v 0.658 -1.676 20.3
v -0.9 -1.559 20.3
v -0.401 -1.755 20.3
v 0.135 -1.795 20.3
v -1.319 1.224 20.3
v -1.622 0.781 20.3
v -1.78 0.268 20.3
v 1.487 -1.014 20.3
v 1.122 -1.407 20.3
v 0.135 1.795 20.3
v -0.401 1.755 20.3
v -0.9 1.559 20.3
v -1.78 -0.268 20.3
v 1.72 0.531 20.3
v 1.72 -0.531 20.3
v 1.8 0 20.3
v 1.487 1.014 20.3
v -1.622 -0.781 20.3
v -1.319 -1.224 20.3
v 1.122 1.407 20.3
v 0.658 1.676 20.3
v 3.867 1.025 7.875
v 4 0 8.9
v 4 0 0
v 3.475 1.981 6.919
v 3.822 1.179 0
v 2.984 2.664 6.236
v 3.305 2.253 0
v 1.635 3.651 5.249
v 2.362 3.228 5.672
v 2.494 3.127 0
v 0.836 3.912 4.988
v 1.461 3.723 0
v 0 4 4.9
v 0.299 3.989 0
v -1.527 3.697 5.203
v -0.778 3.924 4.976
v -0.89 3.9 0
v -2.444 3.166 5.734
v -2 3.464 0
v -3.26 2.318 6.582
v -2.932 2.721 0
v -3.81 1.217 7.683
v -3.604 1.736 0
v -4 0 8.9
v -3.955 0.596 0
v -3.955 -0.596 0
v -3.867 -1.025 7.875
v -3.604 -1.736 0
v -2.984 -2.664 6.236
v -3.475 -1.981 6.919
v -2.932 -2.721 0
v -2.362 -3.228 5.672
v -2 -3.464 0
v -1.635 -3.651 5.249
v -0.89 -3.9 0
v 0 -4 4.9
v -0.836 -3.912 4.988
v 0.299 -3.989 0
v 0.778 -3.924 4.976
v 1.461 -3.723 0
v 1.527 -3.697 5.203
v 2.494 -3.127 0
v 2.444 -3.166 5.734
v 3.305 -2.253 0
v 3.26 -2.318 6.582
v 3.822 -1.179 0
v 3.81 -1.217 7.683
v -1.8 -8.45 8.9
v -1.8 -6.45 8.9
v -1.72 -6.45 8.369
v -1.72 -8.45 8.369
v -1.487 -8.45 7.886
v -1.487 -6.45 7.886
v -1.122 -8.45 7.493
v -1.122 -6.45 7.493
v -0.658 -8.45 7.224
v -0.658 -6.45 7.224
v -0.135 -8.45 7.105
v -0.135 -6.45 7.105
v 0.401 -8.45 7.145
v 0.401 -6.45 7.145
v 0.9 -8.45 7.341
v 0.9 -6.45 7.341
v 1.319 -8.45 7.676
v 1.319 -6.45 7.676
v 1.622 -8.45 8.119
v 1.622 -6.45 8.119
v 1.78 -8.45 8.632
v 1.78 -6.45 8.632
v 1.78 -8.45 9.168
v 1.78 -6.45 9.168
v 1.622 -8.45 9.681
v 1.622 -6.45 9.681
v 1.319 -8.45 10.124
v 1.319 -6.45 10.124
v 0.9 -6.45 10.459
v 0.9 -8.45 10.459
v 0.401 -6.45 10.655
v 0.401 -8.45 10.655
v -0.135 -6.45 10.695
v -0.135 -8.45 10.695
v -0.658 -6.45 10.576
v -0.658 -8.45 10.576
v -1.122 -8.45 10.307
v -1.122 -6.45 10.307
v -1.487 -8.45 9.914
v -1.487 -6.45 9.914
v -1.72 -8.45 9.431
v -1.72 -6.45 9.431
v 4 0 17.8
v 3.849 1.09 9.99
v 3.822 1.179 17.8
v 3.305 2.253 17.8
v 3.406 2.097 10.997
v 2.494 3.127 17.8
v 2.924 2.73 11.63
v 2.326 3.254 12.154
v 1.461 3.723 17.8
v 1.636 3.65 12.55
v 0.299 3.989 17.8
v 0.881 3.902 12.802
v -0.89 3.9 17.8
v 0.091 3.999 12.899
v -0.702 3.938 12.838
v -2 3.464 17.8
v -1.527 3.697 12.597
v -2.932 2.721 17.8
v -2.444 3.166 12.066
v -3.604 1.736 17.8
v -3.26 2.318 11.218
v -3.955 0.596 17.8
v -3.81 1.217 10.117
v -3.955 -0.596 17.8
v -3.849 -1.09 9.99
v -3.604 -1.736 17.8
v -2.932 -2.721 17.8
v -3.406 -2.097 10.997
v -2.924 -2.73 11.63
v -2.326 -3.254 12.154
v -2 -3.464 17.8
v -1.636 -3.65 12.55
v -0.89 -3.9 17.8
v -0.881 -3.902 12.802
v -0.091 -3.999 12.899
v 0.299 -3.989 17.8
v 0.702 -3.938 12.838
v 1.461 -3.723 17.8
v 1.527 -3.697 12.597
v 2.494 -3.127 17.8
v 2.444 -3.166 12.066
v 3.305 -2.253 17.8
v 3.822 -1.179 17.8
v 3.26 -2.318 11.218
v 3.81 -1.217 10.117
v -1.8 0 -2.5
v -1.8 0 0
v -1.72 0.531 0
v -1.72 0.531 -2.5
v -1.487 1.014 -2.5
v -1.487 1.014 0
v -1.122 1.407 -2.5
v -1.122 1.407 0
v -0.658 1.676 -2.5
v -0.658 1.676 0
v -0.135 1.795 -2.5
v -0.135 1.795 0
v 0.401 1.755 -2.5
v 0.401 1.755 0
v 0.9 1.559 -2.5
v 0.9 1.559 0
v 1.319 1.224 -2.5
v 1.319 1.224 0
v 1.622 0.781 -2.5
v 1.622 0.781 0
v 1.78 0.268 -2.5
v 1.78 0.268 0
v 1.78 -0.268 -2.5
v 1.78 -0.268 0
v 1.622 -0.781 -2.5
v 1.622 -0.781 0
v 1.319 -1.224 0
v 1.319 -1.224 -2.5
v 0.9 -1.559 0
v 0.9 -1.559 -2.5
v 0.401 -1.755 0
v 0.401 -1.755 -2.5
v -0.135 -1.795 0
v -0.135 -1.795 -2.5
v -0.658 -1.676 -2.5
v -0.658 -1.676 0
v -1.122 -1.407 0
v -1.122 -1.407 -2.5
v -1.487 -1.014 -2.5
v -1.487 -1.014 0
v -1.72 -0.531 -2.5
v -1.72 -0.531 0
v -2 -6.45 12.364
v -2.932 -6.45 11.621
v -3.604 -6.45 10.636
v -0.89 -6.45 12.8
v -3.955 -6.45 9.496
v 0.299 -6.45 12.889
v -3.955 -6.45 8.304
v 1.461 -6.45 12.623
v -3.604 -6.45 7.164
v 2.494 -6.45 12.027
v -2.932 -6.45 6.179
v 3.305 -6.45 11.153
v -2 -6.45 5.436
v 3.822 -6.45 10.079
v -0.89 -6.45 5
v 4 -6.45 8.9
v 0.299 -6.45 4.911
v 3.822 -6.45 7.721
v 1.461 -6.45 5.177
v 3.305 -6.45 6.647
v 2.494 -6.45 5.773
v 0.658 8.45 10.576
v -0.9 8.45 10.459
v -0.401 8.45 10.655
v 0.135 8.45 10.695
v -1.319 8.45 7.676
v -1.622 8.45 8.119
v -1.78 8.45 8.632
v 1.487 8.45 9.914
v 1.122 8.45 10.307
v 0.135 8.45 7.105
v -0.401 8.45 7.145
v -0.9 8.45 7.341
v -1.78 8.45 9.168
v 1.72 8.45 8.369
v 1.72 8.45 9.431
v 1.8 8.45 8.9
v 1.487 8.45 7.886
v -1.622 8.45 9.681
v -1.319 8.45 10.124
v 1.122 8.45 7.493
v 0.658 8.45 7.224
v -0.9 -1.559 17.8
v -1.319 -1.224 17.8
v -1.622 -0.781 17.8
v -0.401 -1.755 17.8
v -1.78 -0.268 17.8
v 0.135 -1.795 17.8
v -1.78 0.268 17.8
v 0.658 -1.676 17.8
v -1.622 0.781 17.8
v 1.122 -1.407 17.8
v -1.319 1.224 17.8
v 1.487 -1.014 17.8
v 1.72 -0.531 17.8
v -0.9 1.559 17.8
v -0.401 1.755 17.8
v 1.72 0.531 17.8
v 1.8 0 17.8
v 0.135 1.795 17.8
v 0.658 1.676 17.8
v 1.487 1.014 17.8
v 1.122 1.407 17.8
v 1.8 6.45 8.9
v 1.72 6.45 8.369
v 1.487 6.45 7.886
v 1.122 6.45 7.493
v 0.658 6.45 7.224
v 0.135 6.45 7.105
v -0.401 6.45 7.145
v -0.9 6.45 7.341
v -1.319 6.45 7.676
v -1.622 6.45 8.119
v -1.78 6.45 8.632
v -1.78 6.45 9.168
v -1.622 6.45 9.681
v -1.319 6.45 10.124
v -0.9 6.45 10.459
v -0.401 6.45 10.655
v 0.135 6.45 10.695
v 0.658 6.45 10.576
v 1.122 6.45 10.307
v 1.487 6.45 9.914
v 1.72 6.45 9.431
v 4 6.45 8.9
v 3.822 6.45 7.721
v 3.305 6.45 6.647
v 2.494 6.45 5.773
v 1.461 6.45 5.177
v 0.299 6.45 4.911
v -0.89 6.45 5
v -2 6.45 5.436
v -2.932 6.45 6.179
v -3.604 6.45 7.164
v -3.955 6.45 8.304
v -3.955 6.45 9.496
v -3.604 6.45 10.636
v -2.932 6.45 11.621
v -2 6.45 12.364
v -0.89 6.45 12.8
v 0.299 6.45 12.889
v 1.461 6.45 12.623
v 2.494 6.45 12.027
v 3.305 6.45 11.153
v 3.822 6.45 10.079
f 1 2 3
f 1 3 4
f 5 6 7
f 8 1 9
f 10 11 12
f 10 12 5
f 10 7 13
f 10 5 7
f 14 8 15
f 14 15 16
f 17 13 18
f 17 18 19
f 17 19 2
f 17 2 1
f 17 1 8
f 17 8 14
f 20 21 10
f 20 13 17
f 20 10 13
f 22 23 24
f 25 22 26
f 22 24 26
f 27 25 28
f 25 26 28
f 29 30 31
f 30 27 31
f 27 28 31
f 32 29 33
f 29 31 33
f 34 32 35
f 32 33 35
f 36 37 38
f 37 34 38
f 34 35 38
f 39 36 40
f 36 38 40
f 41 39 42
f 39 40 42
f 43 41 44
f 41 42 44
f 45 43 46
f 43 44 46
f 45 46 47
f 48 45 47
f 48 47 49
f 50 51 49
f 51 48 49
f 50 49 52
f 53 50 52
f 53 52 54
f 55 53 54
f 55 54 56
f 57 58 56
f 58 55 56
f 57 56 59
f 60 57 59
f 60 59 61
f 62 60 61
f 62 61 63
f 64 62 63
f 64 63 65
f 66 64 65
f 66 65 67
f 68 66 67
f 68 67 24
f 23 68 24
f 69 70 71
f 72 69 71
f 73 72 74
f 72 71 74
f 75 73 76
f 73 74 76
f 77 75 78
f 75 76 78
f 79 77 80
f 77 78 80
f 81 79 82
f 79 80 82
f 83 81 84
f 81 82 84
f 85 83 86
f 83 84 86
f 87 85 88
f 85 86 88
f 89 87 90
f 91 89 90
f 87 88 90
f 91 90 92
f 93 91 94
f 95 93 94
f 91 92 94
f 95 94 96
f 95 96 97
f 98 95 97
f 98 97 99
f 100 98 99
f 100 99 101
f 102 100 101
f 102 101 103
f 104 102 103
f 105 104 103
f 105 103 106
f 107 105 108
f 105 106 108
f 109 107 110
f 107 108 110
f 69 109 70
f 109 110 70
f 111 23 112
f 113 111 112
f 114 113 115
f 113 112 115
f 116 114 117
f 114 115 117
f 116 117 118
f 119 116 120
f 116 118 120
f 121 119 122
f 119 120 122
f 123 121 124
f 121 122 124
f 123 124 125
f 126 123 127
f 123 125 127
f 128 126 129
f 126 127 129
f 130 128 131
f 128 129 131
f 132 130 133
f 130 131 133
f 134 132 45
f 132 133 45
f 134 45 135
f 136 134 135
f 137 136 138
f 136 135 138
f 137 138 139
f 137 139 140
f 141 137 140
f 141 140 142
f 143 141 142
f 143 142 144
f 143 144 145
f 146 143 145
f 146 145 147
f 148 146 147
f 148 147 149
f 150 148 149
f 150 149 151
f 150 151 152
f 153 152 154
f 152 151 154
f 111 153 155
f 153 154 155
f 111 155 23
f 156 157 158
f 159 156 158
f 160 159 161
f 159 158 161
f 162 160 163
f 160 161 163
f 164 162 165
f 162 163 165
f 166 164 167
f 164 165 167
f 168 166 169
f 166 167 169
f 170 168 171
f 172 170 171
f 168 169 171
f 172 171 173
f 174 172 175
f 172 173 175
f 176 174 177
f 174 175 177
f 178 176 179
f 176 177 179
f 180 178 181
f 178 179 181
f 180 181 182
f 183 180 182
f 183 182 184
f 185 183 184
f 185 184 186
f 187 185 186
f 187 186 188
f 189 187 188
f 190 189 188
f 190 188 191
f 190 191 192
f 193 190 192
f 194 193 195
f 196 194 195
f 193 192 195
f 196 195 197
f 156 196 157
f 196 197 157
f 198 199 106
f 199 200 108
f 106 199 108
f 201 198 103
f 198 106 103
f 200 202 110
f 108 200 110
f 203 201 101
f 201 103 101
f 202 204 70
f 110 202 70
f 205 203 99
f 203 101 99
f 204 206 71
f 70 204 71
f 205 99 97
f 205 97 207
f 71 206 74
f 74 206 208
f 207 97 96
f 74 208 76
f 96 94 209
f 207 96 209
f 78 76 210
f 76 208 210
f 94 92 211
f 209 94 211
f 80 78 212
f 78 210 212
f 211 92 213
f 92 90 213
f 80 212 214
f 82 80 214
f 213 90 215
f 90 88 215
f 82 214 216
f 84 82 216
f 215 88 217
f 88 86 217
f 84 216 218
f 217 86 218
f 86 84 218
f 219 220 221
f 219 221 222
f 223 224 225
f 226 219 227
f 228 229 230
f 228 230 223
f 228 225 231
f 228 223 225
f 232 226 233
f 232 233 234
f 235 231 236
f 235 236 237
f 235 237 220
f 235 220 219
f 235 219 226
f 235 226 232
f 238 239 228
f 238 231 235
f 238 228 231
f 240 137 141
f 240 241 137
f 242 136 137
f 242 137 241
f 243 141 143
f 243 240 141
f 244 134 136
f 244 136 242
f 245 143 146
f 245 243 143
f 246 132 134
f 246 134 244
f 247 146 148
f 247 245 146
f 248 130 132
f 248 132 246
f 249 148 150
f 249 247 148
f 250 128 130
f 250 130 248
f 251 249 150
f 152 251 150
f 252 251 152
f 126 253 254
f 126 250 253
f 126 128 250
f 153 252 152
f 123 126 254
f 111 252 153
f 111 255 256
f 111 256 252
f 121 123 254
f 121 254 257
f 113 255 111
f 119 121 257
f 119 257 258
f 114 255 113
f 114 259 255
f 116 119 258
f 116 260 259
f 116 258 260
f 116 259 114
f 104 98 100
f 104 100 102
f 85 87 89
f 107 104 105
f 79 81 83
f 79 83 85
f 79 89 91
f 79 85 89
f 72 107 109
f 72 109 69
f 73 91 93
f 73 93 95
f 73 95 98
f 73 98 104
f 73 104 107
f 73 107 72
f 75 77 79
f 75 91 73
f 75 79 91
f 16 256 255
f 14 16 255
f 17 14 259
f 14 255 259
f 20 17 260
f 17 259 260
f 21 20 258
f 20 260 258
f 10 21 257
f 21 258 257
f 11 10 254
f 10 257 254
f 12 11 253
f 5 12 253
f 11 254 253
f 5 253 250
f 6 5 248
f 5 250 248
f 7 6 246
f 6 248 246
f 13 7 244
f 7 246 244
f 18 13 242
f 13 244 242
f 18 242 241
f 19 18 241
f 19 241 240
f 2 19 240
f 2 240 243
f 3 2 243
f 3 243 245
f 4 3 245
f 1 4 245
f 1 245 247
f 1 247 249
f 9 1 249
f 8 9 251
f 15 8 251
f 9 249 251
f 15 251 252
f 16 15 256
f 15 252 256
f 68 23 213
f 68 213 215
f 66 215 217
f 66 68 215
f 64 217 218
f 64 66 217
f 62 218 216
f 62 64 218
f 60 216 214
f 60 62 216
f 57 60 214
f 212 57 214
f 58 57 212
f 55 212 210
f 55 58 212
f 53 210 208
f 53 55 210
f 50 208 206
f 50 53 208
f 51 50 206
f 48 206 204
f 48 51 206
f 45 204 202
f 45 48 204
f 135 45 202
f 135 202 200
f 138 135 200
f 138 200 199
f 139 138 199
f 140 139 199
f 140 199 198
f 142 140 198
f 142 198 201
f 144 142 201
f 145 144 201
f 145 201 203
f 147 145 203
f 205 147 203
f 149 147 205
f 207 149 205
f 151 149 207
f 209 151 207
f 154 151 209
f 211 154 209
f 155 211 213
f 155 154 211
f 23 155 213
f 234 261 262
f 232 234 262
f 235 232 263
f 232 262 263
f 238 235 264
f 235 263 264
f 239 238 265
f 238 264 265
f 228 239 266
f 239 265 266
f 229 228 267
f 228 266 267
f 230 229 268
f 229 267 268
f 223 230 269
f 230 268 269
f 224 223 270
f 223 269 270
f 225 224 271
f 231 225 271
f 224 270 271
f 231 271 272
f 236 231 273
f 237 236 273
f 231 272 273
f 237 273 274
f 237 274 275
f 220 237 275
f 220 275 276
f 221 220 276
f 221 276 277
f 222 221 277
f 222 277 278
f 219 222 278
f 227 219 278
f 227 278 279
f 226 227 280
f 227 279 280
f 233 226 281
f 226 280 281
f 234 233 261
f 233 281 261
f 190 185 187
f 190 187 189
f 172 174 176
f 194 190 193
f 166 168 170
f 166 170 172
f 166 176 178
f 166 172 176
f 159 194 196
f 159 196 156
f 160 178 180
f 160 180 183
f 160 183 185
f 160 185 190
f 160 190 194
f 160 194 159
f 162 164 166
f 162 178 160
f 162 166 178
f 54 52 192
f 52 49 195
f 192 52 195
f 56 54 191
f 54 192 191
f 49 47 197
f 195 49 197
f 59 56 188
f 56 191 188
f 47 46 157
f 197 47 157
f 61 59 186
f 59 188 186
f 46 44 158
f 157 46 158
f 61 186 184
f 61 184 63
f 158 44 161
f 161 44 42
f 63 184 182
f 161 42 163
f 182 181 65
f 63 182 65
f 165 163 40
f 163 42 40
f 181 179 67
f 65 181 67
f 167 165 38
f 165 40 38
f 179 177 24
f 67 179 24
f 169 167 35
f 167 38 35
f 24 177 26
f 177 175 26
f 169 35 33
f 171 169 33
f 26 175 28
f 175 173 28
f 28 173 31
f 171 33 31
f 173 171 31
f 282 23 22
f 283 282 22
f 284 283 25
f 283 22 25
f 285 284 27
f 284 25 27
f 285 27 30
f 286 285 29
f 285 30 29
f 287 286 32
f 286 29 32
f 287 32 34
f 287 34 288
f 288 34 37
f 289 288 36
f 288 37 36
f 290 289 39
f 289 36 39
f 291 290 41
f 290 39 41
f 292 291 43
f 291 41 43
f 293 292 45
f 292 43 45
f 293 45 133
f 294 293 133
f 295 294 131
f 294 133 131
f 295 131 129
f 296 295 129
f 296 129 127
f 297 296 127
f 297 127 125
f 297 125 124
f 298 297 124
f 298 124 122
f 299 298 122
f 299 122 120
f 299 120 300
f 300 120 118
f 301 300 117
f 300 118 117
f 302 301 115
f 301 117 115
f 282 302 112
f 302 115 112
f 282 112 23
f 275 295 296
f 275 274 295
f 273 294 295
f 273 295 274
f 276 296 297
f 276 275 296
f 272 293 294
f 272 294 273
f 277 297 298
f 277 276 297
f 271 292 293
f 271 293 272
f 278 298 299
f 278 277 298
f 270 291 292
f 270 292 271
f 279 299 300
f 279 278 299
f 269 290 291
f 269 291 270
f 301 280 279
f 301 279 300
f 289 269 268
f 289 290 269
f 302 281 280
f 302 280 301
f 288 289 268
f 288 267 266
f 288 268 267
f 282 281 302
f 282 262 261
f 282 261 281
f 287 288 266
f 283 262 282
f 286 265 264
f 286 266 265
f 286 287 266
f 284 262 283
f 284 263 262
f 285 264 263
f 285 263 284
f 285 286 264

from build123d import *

# Parameters (mm, degrees)
SKETCH_1_R           = 4
EXTRUDE_1_DEPTH      = 17.8
SKETCH_2_R           = 1.8
EXTRUDE_2_DEPTH      = 2.5
EXTRUDE_START        = 2.5
SKETCH_3_R           = 1.8
EXTRUDE_3_DEPTH      = 2.5
EXTRUDE_4_DEPTH      = 6.45
EXTRUDE_4_DEPTH_BACK = 6.45
SKETCH_4_R           = 4
SKETCH_5_R           = 1.8
EXTRUDE_5_DEPTH      = 2
EXTRUDE_START_2      = 2
SKETCH_6_R           = 1.8
EXTRUDE_6_DEPTH      = 2


with BuildPart() as part:
    # 草图1 → 凸台-拉伸1 (new body)
    with BuildSketch(Plane.XY):
        Circle(SKETCH_1_R)
    extrude(amount=EXTRUDE_1_DEPTH)

    # 草图2 → 凸台-拉伸2 (add)
    with BuildSketch(Plane.XY.offset(17.8)):
        Circle(SKETCH_2_R)
    extrude(amount=EXTRUDE_2_DEPTH)

    # 草图3 → 凸台-拉伸3 (add)
    with BuildSketch(Plane(origin=(0, 0, 0), x_dir=(-1, 0, 0), z_dir=(0, 0, -1)).offset(EXTRUDE_START)):
        Circle(SKETCH_3_R)
    extrude(amount=-EXTRUDE_3_DEPTH)

    # 草图4 → 凸台-拉伸4 (add, two sides: drawn at the far end of the back side and taken through both)
    with BuildSketch(Plane(origin=(0, 0, 0), x_dir=(1, 0, 0), z_dir=(0, 1, 0)).offset(-EXTRUDE_4_DEPTH_BACK)):
        with Locations((0, -8.9)):
            Circle(SKETCH_4_R)
    extrude(amount=EXTRUDE_4_DEPTH + EXTRUDE_4_DEPTH_BACK)

    # 草图5 → 凸台-拉伸5 (add)
    with BuildSketch(Plane(origin=(0, -6.45, 0), x_dir=(-1, 0, 0), z_dir=(0, -1, 0))):
        with Locations((0, -8.9)):
            Circle(SKETCH_5_R)
    extrude(amount=EXTRUDE_5_DEPTH)

    # 草图6 → 凸台-拉伸6 (add)
    with BuildSketch(Plane(origin=(0, 6.45, 0), x_dir=(1, 0, 0), z_dir=(0, 1, 0)).offset(EXTRUDE_START_2)):
        with Locations((0, -8.9)):
            Circle(SKETCH_6_R)
    extrude(amount=-EXTRUDE_6_DEPTH)


solid = part.part
